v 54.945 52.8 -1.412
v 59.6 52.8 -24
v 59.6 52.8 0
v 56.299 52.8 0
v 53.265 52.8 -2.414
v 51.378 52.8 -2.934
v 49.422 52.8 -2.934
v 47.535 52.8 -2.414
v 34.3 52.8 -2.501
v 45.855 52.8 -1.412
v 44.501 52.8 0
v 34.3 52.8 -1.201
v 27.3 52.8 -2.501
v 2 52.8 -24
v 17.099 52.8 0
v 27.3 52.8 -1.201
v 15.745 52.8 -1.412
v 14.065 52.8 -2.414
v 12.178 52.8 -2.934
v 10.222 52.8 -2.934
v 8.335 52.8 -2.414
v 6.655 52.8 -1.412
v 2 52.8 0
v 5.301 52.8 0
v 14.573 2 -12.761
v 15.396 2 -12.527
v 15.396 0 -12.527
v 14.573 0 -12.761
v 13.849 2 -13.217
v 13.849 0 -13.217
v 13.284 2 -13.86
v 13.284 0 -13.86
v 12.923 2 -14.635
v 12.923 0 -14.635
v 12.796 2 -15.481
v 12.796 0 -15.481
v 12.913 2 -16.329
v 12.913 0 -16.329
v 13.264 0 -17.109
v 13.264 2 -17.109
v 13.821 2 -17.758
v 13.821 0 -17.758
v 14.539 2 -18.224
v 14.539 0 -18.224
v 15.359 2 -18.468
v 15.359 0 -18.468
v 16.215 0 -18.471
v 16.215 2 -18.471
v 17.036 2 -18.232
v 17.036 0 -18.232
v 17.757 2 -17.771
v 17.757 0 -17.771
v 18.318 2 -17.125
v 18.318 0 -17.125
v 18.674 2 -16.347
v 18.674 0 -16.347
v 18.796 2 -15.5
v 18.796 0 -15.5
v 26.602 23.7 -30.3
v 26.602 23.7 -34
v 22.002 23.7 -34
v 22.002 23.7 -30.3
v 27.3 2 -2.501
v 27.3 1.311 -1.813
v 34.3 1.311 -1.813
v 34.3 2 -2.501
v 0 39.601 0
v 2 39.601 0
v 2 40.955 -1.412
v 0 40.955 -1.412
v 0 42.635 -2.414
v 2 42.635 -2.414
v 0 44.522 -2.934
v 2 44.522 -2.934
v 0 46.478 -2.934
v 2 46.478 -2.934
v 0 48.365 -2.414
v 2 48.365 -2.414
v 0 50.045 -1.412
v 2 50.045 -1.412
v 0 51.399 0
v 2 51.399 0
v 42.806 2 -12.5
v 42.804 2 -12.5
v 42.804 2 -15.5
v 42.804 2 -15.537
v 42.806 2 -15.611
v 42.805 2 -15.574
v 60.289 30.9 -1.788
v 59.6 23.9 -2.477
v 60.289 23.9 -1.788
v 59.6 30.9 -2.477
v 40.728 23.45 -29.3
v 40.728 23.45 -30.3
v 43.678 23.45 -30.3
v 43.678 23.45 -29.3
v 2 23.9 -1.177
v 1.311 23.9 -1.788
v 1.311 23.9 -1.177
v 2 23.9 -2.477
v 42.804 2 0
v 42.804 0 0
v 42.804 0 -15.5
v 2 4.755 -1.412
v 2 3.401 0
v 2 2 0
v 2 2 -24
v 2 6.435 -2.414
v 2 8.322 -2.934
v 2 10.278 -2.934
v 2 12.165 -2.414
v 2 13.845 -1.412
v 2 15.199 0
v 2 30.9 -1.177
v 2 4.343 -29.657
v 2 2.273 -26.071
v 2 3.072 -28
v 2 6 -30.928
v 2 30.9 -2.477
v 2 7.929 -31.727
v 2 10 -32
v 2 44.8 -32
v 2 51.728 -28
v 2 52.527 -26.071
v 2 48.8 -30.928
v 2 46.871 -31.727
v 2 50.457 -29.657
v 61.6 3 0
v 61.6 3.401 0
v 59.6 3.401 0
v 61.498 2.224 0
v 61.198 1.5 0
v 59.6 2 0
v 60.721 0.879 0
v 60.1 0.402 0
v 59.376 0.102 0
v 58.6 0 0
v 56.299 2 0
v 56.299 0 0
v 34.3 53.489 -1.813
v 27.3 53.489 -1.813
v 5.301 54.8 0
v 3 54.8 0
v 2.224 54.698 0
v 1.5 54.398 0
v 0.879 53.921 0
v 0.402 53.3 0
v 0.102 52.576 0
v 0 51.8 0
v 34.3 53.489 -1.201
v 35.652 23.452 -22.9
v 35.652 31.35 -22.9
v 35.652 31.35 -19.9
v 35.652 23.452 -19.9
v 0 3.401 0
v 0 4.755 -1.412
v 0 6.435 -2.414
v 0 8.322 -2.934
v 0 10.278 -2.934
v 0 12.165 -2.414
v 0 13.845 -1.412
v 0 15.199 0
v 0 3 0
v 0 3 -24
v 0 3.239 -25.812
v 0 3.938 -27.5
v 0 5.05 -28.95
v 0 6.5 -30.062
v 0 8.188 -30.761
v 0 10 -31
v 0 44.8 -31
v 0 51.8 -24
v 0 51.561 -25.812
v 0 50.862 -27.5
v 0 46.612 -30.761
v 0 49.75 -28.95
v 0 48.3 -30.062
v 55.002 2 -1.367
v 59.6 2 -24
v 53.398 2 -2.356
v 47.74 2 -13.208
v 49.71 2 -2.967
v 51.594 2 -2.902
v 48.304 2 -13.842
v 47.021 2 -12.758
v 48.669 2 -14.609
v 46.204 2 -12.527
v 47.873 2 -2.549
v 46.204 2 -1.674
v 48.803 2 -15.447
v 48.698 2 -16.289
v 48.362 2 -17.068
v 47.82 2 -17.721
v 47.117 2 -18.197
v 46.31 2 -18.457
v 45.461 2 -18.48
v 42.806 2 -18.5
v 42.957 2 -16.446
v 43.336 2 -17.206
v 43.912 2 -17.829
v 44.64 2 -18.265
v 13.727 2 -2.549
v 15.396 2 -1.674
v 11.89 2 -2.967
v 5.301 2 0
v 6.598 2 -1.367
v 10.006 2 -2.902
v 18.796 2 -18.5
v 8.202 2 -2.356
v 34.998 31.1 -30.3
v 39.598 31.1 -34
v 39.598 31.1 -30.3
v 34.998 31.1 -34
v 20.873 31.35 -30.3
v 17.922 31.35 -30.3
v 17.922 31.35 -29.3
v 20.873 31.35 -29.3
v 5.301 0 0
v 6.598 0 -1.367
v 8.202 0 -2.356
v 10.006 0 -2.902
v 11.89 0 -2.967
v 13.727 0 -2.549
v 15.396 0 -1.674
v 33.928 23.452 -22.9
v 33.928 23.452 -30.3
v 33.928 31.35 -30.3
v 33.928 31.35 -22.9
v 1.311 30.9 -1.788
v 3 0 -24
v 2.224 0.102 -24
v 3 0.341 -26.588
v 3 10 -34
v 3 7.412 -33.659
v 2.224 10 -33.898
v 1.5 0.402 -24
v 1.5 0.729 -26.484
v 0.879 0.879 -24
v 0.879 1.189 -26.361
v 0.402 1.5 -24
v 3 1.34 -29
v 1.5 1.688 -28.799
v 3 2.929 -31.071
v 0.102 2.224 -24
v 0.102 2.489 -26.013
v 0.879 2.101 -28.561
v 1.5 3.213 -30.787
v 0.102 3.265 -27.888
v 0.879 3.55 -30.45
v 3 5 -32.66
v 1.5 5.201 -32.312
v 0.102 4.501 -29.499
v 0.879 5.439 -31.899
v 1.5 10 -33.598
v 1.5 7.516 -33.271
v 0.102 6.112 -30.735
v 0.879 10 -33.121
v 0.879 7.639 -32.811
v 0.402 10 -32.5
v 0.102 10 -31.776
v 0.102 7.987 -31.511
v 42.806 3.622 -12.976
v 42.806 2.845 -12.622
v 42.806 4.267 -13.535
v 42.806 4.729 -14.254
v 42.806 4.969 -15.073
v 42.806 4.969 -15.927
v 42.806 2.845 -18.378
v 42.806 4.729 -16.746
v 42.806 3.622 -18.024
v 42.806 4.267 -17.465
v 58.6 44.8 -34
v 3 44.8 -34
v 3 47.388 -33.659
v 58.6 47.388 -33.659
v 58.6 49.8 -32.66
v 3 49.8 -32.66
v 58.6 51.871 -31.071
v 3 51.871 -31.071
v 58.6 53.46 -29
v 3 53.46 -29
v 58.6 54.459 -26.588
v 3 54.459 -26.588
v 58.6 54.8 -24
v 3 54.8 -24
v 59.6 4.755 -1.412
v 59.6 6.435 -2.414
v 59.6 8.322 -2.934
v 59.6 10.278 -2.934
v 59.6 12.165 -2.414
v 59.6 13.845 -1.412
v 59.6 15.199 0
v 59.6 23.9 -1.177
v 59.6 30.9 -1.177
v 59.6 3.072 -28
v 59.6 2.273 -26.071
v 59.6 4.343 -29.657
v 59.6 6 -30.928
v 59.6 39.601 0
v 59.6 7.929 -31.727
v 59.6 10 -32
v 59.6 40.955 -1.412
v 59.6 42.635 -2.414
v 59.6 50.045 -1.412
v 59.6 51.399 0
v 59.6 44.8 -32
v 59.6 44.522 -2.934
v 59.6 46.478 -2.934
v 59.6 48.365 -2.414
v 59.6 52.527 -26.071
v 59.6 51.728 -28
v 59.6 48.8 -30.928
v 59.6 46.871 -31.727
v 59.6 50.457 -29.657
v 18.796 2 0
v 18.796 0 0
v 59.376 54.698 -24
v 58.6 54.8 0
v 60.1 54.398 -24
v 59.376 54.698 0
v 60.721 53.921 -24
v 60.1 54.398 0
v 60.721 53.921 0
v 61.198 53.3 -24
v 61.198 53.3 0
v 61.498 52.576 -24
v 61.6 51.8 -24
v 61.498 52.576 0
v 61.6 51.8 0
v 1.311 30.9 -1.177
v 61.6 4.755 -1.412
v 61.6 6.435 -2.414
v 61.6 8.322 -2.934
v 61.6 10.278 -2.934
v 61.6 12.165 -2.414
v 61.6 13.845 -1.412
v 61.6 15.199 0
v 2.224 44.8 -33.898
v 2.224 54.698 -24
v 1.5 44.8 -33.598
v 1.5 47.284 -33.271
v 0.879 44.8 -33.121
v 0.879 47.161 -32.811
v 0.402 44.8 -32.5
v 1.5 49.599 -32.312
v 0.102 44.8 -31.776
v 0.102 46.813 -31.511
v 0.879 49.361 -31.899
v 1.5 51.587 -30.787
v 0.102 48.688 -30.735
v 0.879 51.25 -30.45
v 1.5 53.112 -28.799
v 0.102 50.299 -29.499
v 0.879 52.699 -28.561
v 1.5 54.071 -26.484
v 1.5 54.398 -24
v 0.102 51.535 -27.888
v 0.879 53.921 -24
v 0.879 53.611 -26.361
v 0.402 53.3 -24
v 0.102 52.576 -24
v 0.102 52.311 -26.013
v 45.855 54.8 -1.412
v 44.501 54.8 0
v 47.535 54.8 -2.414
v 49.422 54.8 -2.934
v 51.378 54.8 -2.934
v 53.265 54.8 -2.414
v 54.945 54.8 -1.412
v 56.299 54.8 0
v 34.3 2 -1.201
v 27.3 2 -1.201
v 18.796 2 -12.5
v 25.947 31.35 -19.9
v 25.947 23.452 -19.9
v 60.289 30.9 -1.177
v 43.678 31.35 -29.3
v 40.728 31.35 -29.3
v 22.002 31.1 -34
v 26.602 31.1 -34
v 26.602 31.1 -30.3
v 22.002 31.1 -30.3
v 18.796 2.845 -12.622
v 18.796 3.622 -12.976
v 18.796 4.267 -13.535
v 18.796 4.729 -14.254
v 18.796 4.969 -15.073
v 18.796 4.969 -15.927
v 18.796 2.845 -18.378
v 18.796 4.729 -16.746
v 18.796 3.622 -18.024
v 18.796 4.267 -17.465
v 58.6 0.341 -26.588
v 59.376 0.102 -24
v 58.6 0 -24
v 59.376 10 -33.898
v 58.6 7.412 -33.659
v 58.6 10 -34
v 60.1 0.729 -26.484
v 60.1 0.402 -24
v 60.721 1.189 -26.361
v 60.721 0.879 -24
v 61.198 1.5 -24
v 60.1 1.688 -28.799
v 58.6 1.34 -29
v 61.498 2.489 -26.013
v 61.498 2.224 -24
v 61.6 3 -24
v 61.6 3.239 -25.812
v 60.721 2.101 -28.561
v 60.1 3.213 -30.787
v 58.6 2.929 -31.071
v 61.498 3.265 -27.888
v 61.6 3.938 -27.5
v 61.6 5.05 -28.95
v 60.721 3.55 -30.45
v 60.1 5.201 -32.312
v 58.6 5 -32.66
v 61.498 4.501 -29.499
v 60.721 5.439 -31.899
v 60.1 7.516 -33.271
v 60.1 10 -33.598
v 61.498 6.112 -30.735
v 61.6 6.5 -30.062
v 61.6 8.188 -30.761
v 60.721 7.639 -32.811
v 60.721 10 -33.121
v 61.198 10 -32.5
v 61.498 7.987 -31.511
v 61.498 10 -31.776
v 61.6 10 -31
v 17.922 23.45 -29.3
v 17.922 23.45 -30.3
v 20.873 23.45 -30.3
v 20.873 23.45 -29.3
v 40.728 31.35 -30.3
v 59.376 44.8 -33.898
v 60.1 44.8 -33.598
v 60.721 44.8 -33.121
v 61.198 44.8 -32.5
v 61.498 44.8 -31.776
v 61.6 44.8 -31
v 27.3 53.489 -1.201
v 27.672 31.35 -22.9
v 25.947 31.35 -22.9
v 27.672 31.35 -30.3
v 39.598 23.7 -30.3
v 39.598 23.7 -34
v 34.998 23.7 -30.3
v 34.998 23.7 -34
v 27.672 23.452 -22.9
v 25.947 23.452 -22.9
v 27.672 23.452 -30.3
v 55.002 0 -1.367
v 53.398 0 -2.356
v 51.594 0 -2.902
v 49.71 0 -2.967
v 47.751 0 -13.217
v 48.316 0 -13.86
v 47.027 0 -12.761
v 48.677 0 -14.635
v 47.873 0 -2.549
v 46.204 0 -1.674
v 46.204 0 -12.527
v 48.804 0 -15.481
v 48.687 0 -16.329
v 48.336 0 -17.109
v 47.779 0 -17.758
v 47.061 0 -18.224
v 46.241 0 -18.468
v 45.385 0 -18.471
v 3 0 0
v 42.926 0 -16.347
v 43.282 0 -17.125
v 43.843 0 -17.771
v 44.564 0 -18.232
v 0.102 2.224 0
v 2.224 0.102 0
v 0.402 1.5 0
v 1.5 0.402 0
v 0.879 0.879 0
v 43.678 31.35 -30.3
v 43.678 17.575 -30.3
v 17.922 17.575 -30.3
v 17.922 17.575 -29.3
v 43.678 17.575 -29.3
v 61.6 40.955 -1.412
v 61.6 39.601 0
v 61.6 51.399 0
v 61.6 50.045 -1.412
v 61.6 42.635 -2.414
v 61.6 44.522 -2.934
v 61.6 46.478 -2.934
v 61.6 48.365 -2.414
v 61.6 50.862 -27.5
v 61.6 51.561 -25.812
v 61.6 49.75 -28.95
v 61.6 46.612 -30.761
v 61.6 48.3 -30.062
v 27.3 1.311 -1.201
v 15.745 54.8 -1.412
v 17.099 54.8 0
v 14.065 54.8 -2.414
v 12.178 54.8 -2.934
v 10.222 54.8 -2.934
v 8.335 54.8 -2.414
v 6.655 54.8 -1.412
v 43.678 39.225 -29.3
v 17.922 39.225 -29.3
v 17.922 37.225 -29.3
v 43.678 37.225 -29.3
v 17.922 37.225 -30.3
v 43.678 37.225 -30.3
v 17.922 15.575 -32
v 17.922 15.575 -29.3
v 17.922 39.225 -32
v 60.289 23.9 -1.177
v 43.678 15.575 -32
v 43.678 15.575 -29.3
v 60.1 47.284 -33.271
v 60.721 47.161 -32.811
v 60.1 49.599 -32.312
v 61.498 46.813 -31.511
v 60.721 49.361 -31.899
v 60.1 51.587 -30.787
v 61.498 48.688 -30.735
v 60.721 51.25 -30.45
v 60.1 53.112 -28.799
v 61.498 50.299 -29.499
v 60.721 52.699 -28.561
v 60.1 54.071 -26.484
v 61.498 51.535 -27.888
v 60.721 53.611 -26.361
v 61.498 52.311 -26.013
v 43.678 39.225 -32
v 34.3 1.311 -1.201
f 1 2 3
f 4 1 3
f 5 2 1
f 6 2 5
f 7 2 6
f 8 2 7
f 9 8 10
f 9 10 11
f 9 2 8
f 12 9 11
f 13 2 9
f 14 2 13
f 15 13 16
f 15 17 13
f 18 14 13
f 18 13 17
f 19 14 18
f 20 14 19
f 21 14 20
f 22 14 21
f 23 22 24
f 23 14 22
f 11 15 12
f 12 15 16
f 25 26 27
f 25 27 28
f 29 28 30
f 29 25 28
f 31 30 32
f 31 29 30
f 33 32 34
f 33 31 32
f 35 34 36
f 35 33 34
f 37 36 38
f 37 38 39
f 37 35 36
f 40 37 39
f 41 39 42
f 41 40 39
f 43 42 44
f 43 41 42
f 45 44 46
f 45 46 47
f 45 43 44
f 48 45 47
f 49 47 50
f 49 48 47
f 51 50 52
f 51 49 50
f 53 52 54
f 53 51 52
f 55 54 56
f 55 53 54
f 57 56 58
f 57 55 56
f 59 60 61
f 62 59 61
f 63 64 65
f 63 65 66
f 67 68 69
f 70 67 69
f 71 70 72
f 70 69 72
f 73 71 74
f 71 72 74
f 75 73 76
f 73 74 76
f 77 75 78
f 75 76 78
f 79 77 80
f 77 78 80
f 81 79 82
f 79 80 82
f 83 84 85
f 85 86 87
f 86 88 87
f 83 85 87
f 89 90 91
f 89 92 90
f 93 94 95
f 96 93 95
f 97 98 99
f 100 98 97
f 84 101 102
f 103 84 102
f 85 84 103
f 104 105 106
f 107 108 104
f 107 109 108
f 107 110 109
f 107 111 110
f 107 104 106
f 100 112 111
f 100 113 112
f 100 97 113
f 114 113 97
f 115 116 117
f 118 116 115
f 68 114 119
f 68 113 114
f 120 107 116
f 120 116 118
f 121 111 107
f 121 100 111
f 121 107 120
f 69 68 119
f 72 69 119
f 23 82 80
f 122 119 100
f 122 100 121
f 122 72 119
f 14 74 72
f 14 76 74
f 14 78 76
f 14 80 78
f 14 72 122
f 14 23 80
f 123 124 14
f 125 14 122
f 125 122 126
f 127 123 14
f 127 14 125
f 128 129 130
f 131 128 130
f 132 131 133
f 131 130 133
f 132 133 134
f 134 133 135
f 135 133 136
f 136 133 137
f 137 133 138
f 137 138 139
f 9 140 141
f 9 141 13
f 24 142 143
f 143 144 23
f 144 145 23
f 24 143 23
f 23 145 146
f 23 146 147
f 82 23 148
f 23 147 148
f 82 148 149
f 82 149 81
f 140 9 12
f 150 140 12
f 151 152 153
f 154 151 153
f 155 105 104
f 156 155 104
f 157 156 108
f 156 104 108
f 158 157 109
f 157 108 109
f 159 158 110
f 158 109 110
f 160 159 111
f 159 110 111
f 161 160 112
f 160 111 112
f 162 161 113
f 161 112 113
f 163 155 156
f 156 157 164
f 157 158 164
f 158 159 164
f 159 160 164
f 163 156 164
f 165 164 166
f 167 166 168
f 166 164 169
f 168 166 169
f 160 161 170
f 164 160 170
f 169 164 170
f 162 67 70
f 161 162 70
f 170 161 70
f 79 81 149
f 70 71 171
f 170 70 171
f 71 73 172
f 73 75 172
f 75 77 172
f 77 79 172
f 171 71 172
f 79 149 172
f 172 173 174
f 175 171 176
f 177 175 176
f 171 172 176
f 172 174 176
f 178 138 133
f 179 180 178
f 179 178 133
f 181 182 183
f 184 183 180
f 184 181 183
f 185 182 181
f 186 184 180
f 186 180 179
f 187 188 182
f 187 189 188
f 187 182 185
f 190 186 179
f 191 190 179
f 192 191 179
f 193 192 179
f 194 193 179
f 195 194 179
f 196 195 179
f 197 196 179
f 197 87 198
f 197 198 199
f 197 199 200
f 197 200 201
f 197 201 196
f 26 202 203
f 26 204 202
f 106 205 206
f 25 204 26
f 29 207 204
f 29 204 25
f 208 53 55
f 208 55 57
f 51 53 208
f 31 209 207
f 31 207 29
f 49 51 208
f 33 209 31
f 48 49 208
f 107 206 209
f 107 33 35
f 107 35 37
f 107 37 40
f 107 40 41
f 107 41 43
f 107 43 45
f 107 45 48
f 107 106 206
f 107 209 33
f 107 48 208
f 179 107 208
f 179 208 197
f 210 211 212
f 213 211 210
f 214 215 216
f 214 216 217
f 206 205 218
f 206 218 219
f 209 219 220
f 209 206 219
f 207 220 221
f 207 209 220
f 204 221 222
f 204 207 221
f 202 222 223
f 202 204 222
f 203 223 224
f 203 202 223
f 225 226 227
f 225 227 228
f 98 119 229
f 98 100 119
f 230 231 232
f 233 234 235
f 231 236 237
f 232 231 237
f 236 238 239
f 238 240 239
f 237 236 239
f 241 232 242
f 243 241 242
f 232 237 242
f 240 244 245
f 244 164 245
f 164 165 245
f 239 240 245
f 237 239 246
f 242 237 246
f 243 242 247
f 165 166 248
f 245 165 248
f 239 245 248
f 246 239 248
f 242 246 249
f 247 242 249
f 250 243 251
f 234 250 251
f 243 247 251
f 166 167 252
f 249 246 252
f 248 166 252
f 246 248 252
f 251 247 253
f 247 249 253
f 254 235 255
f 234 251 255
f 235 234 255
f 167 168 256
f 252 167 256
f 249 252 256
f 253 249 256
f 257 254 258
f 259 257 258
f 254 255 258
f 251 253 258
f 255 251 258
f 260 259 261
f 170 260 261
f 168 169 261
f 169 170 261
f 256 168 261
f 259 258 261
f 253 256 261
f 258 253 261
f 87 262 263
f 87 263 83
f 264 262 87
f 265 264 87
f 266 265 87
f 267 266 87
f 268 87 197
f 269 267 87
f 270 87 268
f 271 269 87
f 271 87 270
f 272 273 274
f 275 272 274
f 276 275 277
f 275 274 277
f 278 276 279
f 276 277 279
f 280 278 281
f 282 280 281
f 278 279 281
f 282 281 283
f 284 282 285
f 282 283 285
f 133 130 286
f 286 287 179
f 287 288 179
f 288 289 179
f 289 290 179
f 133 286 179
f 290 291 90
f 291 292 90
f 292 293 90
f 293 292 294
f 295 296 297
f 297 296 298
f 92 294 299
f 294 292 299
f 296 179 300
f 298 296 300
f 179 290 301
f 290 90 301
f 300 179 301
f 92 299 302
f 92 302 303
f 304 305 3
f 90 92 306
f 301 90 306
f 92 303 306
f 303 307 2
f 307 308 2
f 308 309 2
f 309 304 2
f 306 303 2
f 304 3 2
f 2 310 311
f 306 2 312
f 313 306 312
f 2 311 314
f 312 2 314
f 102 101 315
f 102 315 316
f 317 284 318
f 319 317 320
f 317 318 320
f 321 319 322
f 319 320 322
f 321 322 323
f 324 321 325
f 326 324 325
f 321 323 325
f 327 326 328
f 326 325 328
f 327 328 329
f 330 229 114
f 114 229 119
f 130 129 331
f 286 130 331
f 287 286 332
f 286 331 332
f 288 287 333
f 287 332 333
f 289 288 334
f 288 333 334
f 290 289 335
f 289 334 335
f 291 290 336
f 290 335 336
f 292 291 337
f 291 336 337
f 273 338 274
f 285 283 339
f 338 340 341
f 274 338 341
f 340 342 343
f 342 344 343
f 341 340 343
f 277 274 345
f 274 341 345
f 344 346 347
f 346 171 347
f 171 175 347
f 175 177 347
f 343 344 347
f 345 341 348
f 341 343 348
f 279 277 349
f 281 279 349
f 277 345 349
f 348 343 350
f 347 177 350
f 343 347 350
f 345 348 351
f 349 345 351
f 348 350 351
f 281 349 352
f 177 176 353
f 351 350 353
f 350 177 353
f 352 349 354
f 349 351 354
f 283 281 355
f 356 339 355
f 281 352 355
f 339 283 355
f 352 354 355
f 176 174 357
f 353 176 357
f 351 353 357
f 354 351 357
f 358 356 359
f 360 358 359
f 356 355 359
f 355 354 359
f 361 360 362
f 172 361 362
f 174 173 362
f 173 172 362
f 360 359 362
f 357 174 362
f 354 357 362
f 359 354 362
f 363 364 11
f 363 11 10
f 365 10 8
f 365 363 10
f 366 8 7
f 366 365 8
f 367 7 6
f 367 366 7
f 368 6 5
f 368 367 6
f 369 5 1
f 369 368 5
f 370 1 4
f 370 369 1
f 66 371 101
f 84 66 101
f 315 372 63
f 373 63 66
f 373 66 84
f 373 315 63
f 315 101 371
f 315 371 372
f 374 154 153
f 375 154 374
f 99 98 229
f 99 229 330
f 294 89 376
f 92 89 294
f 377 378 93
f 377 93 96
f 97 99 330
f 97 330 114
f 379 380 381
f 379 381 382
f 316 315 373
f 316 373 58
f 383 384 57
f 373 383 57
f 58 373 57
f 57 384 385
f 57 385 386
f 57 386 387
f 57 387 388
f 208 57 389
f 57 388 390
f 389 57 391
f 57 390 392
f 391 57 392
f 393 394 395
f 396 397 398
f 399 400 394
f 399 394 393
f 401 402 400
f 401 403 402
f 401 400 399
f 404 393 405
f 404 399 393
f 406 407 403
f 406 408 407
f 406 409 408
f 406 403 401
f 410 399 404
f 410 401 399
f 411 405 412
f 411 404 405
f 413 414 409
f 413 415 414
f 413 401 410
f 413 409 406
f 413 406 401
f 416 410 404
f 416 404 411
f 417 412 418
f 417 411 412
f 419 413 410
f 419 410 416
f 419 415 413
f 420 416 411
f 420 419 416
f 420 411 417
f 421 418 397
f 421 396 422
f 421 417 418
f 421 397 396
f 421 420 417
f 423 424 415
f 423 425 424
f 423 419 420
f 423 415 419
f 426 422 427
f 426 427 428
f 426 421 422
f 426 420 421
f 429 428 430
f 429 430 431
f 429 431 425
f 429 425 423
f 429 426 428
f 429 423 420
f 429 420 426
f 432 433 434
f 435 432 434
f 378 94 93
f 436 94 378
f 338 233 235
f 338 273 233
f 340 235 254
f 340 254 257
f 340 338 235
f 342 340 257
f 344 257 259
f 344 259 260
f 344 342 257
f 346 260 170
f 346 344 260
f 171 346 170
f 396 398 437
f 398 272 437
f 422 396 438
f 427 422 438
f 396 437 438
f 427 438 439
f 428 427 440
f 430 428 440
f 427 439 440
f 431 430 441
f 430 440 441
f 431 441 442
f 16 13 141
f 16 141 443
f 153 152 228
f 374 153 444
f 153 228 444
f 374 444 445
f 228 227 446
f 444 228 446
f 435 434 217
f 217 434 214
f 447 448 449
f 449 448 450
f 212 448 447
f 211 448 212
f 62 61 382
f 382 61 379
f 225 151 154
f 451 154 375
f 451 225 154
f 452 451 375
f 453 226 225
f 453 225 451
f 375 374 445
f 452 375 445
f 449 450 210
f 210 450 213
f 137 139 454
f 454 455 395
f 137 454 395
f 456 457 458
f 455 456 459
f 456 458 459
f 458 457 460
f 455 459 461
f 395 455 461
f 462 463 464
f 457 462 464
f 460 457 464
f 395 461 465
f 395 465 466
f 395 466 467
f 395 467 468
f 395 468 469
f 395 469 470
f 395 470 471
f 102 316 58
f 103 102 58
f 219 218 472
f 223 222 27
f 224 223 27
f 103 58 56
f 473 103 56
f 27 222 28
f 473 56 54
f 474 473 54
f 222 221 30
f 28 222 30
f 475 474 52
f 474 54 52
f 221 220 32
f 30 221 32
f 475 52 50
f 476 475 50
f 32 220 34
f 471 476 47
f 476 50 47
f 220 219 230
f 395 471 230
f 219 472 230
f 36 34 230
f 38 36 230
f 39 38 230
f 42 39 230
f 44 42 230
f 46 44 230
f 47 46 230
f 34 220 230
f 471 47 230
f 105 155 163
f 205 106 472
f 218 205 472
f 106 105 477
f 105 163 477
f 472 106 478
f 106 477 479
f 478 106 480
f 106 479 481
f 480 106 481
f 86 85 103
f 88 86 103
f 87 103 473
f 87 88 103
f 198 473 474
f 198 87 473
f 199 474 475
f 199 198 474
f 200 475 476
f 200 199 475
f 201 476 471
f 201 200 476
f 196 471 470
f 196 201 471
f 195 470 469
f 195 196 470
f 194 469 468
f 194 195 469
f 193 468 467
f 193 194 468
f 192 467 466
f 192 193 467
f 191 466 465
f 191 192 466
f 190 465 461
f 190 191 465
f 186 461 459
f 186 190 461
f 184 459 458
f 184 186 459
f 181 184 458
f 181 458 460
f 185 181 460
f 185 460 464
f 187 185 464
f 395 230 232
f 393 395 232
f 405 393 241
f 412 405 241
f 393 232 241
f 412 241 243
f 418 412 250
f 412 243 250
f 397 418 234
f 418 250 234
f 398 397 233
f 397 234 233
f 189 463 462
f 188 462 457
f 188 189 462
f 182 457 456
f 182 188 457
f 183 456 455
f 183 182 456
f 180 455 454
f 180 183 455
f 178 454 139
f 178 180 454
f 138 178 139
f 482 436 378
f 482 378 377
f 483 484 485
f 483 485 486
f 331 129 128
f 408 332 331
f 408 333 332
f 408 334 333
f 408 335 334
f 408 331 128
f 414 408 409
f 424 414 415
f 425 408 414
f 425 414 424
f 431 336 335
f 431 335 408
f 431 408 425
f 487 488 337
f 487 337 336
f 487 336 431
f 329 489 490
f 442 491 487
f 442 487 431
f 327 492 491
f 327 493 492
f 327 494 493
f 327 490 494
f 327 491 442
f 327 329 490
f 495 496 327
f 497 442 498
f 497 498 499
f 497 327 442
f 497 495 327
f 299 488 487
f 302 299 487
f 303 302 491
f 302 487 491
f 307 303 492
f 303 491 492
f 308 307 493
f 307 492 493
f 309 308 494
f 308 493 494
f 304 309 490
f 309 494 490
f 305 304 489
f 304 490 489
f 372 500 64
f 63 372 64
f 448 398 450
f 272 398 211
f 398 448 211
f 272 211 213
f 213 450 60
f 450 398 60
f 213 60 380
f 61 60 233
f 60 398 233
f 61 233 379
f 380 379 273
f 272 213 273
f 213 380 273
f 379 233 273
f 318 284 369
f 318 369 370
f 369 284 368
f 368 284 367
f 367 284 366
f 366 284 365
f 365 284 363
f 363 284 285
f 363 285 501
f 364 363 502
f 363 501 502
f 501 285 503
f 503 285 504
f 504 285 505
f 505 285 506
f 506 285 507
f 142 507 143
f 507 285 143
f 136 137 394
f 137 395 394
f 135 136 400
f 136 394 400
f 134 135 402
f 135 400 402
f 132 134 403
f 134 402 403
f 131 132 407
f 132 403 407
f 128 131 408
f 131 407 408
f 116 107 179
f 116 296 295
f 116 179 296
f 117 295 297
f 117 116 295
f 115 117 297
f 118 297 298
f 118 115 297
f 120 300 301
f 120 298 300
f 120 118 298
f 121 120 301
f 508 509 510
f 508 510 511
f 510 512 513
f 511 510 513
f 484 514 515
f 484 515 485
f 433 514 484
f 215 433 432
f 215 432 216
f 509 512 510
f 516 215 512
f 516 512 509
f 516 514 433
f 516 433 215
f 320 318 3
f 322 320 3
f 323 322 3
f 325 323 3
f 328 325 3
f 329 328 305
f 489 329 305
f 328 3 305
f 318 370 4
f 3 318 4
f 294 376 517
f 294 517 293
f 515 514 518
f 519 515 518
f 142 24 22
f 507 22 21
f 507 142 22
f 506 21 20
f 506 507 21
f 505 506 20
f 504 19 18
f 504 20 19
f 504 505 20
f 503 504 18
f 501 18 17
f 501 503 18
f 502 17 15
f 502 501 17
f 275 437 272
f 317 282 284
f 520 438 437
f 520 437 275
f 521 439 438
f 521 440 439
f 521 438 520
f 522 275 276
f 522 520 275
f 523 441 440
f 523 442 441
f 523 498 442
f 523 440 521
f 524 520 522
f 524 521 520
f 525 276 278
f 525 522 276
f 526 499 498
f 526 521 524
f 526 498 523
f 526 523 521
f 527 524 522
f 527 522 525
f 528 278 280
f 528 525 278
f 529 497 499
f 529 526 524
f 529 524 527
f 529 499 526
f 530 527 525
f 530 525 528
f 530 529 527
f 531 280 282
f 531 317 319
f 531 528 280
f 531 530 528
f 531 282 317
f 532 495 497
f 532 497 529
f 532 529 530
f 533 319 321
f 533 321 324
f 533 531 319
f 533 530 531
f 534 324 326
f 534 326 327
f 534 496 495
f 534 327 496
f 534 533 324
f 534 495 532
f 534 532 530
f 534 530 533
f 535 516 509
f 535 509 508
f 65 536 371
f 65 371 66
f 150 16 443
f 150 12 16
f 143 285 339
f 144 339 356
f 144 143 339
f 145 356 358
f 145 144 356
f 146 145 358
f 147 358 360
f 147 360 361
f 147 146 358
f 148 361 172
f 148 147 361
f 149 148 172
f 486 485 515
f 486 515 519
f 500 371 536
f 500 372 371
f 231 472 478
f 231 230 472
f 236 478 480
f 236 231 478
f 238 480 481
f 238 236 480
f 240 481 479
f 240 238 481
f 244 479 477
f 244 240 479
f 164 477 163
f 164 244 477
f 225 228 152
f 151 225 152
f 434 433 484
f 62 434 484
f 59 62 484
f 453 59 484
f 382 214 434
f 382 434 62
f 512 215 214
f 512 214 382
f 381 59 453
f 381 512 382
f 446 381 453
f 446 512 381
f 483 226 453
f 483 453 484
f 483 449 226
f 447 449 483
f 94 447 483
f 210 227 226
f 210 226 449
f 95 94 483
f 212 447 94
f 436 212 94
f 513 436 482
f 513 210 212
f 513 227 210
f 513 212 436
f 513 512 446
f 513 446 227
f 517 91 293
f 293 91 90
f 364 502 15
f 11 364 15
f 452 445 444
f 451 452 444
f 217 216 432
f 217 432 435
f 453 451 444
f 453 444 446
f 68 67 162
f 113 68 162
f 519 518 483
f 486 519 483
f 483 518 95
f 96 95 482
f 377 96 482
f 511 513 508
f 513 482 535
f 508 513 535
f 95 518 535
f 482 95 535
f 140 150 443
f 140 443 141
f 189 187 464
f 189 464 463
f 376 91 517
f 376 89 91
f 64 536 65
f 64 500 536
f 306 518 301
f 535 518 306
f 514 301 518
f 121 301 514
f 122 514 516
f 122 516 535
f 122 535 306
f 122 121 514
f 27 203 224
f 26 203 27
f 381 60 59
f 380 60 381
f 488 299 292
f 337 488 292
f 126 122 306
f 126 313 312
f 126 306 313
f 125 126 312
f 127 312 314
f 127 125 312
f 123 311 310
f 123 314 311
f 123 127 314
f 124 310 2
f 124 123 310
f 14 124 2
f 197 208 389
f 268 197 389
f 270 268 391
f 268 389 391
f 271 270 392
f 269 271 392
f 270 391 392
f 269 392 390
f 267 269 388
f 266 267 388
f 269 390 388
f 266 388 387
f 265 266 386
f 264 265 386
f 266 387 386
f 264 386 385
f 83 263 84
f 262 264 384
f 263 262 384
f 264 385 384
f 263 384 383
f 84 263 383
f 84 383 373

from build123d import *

# Parameters (mm, degrees)
EXTRUDE_1_DEPTH     = 61.6
SHELL_1_T           = -2
FILLET_2_R          = 3
CUT_EXTRUDE_1_REACH = 36
SKETCH_3_W          = 4.6
SKETCH_3_H          = 7.4
SKETCH_4_W          = 4.6
SKETCH_4_H          = 7.4
EXTRUDE_2_DEPTH     = 3.7
SKETCH_5_W          = 2.95
SKETCH_5_H          = 7.9
SKETCH_5_W_2        = 25.755
SKETCH_5_H_2        = 2
EXTRUDE_3_DEPTH     = 1
EXTRUDE_4_DEPTH     = 7.897587
CUT_EXTRUDE_START   = -61.6
CUT_EXTRUDE_3_DEPTH = 61.6
CUT_EXTRUDE_START_2 = -54.8
CUT_EXTRUDE_4_DEPTH = 54.8
CUT_EXTRUDE_5_DEPTH = 3.5
CUT_EXTRUDE_6_DEPTH = 3.5
CUT_EXTRUDE_START_3 = -2
CUT_EXTRUDE_7_DEPTH = 2
EXTRUDE_5_DEPTH     = 24.01


with BuildPart() as part:
    # ｽｹｯﾁ2 → ﾎﾞｽ - 押し出し1 (new body)
    with BuildSketch(Plane(origin=(0, 0, 0), x_dir=(0, 0, -1), z_dir=(1, 0, 0))):
        with BuildLine():
            Line((0, 0), (24, 0))
            ThreePointArc((24, 0), (31.071067812, 2.928932188), (34, 10))
            Line((34, 10), (34, 44.8))
            ThreePointArc((34, 44.8), (31.071067812, 51.871067812), (24, 54.8))
            Line((24, 54.8), (0, 54.8))
            Line((0, 54.8), (0, 0))
        make_face()
    extrude(amount=EXTRUDE_1_DEPTH)

    # ｼｪﾙ1
    shell_1_openings = [part.faces().sort_by_distance(p)[0] for p in [
        (30.8, 27.4, 0),
    ]]
    offset(amount=SHELL_1_T, openings=shell_1_openings, kind=Kind.INTERSECTION)

    # ﾌｨﾚｯﾄ2
    fillet_2_edges = [part.edges().sort_by_distance(p)[0] for p in [
        (61.6, 2.928932188, -31.071067812),
        (61.6, 27.4, -34),
        (61.6, 51.871067812, -31.071067812),
        (61.6, 54.8, -12),
        (0, 54.8, -12),
        (0, 51.871067812, -31.071067812),
        (0, 27.4, -34),
        (61.6, 0, -12),
        (0, 2.928932188, -31.071067812),
        (0, 0, -12),
    ]]
    fillet(fillet_2_edges, radius=FILLET_2_R)

    # ｽｹｯﾁ3 → ｶｯﾄ - 押し出し1 (cut, up to next)
    with BuildSketch(Plane(origin=(0, 0, -34), x_dir=(-1, 0, 0), z_dir=(0, 0, -1)), mode=Mode.PRIVATE) as cut_extrude_1_sk1:
        with Locations((-37.2975, 27.4)):
            Rectangle(SKETCH_3_W, SKETCH_3_H)
    cut_extrude_1_tool1 = extrude(cut_extrude_1_sk1.sketch, amount=-CUT_EXTRUDE_1_REACH, mode=Mode.PRIVATE) & part.part
    add(cut_extrude_1_tool1.solids().sort_by_distance((37.2975, 27.4, -34))[0], mode=Mode.SUBTRACT)
    # ｽｹｯﾁ3 → ｶｯﾄ - 押し出し1 (cut, up to next)
    with BuildSketch(Plane(origin=(0, 0, -34), x_dir=(-1, 0, 0), z_dir=(0, 0, -1)), mode=Mode.PRIVATE) as cut_extrude_1_sk2:
        with Locations((-24.3025, 27.4)):
            Rectangle(SKETCH_3_W, SKETCH_3_H)
    cut_extrude_1_tool2 = extrude(cut_extrude_1_sk2.sketch, amount=-CUT_EXTRUDE_1_REACH, mode=Mode.PRIVATE) & part.part
    add(cut_extrude_1_tool2.solids().sort_by_distance((24.3025, 27.4, -34))[0], mode=Mode.SUBTRACT)

    # ｽｹｯﾁ4 → ﾎﾞｽ - 押し出し2 (add)
    with BuildSketch(Plane.XY.offset(-34)):
        Polygon((17.9225, 15.575), (30.6725, 15.575), (43.6775, 15.575), (43.6775, 39.225), (30.6725, 39.225), (17.9225, 39.225), align=None)
        with Locations((24.3025, 27.4)):
            Rectangle(SKETCH_4_W, SKETCH_4_H, mode=Mode.SUBTRACT)
        with Locations((37.2975, 27.4)):
            Rectangle(SKETCH_4_W, SKETCH_4_H, mode=Mode.SUBTRACT)
    extrude(amount=EXTRUDE_2_DEPTH)

    # ｽｹｯﾁ5 → ﾎﾞｽ - 押し出し3 (add)
    with BuildSketch(Plane.XY.offset(-30.3)):
        with Locations((19.3975, 27.4)):
            Rectangle(SKETCH_5_W, SKETCH_5_H)
        with Locations((42.2025, 27.4)):
            Rectangle(SKETCH_5_W, SKETCH_5_H)
        with Locations((30.8, 38.225)):
            Rectangle(SKETCH_5_W_2, SKETCH_5_H_2)
        with Locations((30.8, 16.575)):
            Rectangle(SKETCH_5_W_2, SKETCH_5_H_2)
    extrude(amount=EXTRUDE_3_DEPTH)

    # ｽｹｯﾁ6 → ﾎﾞｽ - 押し出し4 (add)
    with BuildSketch(Plane(origin=(-6.518280687, 23.45241299, -44.223812227), x_dir=(1, 0, 0), z_dir=(0, 1, 0))):
        Polygon((34.190780687, -13.923812227), (40.445780687, -13.923812227), (40.445780687, -21.323812227), (42.170780687, -21.323812227), (42.170780687, -24.323812227), (32.465780687, -24.323812227), (32.465780687, -21.323812227), (34.190780687, -21.323812227), align=None)
    extrude(amount=EXTRUDE_4_DEPTH)

    # ｽｹｯﾁ8 → ｶｯﾄ - 押し出し3 (cut)
    with BuildSketch(Plane.ZY.offset(CUT_EXTRUDE_START)):
        with BuildLine():
            Line((0, 51.399152482), (0, 39.600847518))
            ThreePointArc((0, 39.600847518), (-3, 45.5), (0, 51.399152482))
        make_face()
        with BuildLine():
            Line((0, 15.199152482), (0, 3.400847518))
            ThreePointArc((0, 3.400847518), (-3, 9.3), (0, 15.199152482))
        make_face()
    extrude(amount=CUT_EXTRUDE_3_DEPTH, mode=Mode.SUBTRACT)

    # ｽｹｯﾁ9 → ｶｯﾄ - 押し出し4 (cut)
    with BuildSketch(Plane.XZ.offset(CUT_EXTRUDE_START_2)):
        with BuildLine():
            Line((56.299152482, 0), (44.500847518, 0))
            ThreePointArc((44.500847518, 0), (50.4, -3), (56.299152482, 0))
        make_face()
        with BuildLine():
            Line((17.099152482, 0), (5.300847518, 0))
            ThreePointArc((5.300847518, 0), (11.2, -3), (17.099152482, 0))
        make_face()
    extrude(amount=CUT_EXTRUDE_4_DEPTH, mode=Mode.SUBTRACT)

    # ｽｹｯﾁ11 → ｶｯﾄ - 押し出し5 (cut, symmetric)
    with BuildSketch(Plane(origin=(0, 27.4, 0), x_dir=(-1, 0, 0), z_dir=(0, -1, 0))):
        Polygon((-59.6, 1.176601917), (-59.6, 2.476687437), (-60.288664164, 1.788023273), (-60.288664164, 1.176601917), align=None)
        Polygon((-1.311335836, 1.176601917), (-2, 1.176601917), (-2, 2.476687437), (-1.311335836, 1.788023273), align=None)
    extrude(amount=CUT_EXTRUDE_5_DEPTH, both=True, mode=Mode.SUBTRACT)

    # ｽｹｯﾁ12 → ｶｯﾄ - 押し出し6 (cut, symmetric)
    with BuildSketch(Plane(origin=(30.8, 0, 0), x_dir=(0, 0, -1), z_dir=(1, 0, 0))):
        Polygon((2.501421356, 2), (1.201335836, 2), (1.201335836, 1.311335836), (1.812757192, 1.311335836), align=None)
        Polygon((1.812757192, 53.488664164), (2.501421356, 52.8), (1.201335836, 52.8), (1.201335836, 53.488664164), align=None)
    extrude(amount=CUT_EXTRUDE_6_DEPTH, both=True, mode=Mode.SUBTRACT)

    # ｽｹｯﾁ13 → ｶｯﾄ - 押し出し7 (cut)
    with BuildSketch(Plane.XZ.offset(CUT_EXTRUDE_START_3)):
        with BuildLine():
            Line((15.396028325, 0), (15.396028325, -12.526786251))
            ThreePointArc((15.396028325, -12.526786251), (13.821186559, -17.758317958), (18.796028325, -15.5))
            Line((18.796028325, -15.5), (18.796028325, 0))
            Line((18.796028325, 0), (15.396028325, 0))
        make_face()
        with BuildLine():
            Line((46.203971675, 0), (42.803971675, 0))
            Line((42.803971675, 0), (42.803971675, -15.5))
            ThreePointArc((42.803971675, -15.5), (47.778813441, -17.758317958), (46.203971675, -12.526786251))
            Line((46.203971675, -12.526786251), (46.203971675, 0))
        make_face()
    extrude(amount=CUT_EXTRUDE_7_DEPTH, mode=Mode.SUBTRACT)

    # ｽｹｯﾁ14 → ﾎﾞｽ - 押し出し5 (add)
    with BuildSketch(Plane.ZY.offset(-18.796028325)):
        with BuildLine():
            Line((-12.5, 2), (-18.5, 2))
            ThreePointArc((-18.5, 2), (-15.5, 5), (-12.5, 2))
        make_face()
    extrude(amount=-EXTRUDE_5_DEPTH)


solid = part.part
